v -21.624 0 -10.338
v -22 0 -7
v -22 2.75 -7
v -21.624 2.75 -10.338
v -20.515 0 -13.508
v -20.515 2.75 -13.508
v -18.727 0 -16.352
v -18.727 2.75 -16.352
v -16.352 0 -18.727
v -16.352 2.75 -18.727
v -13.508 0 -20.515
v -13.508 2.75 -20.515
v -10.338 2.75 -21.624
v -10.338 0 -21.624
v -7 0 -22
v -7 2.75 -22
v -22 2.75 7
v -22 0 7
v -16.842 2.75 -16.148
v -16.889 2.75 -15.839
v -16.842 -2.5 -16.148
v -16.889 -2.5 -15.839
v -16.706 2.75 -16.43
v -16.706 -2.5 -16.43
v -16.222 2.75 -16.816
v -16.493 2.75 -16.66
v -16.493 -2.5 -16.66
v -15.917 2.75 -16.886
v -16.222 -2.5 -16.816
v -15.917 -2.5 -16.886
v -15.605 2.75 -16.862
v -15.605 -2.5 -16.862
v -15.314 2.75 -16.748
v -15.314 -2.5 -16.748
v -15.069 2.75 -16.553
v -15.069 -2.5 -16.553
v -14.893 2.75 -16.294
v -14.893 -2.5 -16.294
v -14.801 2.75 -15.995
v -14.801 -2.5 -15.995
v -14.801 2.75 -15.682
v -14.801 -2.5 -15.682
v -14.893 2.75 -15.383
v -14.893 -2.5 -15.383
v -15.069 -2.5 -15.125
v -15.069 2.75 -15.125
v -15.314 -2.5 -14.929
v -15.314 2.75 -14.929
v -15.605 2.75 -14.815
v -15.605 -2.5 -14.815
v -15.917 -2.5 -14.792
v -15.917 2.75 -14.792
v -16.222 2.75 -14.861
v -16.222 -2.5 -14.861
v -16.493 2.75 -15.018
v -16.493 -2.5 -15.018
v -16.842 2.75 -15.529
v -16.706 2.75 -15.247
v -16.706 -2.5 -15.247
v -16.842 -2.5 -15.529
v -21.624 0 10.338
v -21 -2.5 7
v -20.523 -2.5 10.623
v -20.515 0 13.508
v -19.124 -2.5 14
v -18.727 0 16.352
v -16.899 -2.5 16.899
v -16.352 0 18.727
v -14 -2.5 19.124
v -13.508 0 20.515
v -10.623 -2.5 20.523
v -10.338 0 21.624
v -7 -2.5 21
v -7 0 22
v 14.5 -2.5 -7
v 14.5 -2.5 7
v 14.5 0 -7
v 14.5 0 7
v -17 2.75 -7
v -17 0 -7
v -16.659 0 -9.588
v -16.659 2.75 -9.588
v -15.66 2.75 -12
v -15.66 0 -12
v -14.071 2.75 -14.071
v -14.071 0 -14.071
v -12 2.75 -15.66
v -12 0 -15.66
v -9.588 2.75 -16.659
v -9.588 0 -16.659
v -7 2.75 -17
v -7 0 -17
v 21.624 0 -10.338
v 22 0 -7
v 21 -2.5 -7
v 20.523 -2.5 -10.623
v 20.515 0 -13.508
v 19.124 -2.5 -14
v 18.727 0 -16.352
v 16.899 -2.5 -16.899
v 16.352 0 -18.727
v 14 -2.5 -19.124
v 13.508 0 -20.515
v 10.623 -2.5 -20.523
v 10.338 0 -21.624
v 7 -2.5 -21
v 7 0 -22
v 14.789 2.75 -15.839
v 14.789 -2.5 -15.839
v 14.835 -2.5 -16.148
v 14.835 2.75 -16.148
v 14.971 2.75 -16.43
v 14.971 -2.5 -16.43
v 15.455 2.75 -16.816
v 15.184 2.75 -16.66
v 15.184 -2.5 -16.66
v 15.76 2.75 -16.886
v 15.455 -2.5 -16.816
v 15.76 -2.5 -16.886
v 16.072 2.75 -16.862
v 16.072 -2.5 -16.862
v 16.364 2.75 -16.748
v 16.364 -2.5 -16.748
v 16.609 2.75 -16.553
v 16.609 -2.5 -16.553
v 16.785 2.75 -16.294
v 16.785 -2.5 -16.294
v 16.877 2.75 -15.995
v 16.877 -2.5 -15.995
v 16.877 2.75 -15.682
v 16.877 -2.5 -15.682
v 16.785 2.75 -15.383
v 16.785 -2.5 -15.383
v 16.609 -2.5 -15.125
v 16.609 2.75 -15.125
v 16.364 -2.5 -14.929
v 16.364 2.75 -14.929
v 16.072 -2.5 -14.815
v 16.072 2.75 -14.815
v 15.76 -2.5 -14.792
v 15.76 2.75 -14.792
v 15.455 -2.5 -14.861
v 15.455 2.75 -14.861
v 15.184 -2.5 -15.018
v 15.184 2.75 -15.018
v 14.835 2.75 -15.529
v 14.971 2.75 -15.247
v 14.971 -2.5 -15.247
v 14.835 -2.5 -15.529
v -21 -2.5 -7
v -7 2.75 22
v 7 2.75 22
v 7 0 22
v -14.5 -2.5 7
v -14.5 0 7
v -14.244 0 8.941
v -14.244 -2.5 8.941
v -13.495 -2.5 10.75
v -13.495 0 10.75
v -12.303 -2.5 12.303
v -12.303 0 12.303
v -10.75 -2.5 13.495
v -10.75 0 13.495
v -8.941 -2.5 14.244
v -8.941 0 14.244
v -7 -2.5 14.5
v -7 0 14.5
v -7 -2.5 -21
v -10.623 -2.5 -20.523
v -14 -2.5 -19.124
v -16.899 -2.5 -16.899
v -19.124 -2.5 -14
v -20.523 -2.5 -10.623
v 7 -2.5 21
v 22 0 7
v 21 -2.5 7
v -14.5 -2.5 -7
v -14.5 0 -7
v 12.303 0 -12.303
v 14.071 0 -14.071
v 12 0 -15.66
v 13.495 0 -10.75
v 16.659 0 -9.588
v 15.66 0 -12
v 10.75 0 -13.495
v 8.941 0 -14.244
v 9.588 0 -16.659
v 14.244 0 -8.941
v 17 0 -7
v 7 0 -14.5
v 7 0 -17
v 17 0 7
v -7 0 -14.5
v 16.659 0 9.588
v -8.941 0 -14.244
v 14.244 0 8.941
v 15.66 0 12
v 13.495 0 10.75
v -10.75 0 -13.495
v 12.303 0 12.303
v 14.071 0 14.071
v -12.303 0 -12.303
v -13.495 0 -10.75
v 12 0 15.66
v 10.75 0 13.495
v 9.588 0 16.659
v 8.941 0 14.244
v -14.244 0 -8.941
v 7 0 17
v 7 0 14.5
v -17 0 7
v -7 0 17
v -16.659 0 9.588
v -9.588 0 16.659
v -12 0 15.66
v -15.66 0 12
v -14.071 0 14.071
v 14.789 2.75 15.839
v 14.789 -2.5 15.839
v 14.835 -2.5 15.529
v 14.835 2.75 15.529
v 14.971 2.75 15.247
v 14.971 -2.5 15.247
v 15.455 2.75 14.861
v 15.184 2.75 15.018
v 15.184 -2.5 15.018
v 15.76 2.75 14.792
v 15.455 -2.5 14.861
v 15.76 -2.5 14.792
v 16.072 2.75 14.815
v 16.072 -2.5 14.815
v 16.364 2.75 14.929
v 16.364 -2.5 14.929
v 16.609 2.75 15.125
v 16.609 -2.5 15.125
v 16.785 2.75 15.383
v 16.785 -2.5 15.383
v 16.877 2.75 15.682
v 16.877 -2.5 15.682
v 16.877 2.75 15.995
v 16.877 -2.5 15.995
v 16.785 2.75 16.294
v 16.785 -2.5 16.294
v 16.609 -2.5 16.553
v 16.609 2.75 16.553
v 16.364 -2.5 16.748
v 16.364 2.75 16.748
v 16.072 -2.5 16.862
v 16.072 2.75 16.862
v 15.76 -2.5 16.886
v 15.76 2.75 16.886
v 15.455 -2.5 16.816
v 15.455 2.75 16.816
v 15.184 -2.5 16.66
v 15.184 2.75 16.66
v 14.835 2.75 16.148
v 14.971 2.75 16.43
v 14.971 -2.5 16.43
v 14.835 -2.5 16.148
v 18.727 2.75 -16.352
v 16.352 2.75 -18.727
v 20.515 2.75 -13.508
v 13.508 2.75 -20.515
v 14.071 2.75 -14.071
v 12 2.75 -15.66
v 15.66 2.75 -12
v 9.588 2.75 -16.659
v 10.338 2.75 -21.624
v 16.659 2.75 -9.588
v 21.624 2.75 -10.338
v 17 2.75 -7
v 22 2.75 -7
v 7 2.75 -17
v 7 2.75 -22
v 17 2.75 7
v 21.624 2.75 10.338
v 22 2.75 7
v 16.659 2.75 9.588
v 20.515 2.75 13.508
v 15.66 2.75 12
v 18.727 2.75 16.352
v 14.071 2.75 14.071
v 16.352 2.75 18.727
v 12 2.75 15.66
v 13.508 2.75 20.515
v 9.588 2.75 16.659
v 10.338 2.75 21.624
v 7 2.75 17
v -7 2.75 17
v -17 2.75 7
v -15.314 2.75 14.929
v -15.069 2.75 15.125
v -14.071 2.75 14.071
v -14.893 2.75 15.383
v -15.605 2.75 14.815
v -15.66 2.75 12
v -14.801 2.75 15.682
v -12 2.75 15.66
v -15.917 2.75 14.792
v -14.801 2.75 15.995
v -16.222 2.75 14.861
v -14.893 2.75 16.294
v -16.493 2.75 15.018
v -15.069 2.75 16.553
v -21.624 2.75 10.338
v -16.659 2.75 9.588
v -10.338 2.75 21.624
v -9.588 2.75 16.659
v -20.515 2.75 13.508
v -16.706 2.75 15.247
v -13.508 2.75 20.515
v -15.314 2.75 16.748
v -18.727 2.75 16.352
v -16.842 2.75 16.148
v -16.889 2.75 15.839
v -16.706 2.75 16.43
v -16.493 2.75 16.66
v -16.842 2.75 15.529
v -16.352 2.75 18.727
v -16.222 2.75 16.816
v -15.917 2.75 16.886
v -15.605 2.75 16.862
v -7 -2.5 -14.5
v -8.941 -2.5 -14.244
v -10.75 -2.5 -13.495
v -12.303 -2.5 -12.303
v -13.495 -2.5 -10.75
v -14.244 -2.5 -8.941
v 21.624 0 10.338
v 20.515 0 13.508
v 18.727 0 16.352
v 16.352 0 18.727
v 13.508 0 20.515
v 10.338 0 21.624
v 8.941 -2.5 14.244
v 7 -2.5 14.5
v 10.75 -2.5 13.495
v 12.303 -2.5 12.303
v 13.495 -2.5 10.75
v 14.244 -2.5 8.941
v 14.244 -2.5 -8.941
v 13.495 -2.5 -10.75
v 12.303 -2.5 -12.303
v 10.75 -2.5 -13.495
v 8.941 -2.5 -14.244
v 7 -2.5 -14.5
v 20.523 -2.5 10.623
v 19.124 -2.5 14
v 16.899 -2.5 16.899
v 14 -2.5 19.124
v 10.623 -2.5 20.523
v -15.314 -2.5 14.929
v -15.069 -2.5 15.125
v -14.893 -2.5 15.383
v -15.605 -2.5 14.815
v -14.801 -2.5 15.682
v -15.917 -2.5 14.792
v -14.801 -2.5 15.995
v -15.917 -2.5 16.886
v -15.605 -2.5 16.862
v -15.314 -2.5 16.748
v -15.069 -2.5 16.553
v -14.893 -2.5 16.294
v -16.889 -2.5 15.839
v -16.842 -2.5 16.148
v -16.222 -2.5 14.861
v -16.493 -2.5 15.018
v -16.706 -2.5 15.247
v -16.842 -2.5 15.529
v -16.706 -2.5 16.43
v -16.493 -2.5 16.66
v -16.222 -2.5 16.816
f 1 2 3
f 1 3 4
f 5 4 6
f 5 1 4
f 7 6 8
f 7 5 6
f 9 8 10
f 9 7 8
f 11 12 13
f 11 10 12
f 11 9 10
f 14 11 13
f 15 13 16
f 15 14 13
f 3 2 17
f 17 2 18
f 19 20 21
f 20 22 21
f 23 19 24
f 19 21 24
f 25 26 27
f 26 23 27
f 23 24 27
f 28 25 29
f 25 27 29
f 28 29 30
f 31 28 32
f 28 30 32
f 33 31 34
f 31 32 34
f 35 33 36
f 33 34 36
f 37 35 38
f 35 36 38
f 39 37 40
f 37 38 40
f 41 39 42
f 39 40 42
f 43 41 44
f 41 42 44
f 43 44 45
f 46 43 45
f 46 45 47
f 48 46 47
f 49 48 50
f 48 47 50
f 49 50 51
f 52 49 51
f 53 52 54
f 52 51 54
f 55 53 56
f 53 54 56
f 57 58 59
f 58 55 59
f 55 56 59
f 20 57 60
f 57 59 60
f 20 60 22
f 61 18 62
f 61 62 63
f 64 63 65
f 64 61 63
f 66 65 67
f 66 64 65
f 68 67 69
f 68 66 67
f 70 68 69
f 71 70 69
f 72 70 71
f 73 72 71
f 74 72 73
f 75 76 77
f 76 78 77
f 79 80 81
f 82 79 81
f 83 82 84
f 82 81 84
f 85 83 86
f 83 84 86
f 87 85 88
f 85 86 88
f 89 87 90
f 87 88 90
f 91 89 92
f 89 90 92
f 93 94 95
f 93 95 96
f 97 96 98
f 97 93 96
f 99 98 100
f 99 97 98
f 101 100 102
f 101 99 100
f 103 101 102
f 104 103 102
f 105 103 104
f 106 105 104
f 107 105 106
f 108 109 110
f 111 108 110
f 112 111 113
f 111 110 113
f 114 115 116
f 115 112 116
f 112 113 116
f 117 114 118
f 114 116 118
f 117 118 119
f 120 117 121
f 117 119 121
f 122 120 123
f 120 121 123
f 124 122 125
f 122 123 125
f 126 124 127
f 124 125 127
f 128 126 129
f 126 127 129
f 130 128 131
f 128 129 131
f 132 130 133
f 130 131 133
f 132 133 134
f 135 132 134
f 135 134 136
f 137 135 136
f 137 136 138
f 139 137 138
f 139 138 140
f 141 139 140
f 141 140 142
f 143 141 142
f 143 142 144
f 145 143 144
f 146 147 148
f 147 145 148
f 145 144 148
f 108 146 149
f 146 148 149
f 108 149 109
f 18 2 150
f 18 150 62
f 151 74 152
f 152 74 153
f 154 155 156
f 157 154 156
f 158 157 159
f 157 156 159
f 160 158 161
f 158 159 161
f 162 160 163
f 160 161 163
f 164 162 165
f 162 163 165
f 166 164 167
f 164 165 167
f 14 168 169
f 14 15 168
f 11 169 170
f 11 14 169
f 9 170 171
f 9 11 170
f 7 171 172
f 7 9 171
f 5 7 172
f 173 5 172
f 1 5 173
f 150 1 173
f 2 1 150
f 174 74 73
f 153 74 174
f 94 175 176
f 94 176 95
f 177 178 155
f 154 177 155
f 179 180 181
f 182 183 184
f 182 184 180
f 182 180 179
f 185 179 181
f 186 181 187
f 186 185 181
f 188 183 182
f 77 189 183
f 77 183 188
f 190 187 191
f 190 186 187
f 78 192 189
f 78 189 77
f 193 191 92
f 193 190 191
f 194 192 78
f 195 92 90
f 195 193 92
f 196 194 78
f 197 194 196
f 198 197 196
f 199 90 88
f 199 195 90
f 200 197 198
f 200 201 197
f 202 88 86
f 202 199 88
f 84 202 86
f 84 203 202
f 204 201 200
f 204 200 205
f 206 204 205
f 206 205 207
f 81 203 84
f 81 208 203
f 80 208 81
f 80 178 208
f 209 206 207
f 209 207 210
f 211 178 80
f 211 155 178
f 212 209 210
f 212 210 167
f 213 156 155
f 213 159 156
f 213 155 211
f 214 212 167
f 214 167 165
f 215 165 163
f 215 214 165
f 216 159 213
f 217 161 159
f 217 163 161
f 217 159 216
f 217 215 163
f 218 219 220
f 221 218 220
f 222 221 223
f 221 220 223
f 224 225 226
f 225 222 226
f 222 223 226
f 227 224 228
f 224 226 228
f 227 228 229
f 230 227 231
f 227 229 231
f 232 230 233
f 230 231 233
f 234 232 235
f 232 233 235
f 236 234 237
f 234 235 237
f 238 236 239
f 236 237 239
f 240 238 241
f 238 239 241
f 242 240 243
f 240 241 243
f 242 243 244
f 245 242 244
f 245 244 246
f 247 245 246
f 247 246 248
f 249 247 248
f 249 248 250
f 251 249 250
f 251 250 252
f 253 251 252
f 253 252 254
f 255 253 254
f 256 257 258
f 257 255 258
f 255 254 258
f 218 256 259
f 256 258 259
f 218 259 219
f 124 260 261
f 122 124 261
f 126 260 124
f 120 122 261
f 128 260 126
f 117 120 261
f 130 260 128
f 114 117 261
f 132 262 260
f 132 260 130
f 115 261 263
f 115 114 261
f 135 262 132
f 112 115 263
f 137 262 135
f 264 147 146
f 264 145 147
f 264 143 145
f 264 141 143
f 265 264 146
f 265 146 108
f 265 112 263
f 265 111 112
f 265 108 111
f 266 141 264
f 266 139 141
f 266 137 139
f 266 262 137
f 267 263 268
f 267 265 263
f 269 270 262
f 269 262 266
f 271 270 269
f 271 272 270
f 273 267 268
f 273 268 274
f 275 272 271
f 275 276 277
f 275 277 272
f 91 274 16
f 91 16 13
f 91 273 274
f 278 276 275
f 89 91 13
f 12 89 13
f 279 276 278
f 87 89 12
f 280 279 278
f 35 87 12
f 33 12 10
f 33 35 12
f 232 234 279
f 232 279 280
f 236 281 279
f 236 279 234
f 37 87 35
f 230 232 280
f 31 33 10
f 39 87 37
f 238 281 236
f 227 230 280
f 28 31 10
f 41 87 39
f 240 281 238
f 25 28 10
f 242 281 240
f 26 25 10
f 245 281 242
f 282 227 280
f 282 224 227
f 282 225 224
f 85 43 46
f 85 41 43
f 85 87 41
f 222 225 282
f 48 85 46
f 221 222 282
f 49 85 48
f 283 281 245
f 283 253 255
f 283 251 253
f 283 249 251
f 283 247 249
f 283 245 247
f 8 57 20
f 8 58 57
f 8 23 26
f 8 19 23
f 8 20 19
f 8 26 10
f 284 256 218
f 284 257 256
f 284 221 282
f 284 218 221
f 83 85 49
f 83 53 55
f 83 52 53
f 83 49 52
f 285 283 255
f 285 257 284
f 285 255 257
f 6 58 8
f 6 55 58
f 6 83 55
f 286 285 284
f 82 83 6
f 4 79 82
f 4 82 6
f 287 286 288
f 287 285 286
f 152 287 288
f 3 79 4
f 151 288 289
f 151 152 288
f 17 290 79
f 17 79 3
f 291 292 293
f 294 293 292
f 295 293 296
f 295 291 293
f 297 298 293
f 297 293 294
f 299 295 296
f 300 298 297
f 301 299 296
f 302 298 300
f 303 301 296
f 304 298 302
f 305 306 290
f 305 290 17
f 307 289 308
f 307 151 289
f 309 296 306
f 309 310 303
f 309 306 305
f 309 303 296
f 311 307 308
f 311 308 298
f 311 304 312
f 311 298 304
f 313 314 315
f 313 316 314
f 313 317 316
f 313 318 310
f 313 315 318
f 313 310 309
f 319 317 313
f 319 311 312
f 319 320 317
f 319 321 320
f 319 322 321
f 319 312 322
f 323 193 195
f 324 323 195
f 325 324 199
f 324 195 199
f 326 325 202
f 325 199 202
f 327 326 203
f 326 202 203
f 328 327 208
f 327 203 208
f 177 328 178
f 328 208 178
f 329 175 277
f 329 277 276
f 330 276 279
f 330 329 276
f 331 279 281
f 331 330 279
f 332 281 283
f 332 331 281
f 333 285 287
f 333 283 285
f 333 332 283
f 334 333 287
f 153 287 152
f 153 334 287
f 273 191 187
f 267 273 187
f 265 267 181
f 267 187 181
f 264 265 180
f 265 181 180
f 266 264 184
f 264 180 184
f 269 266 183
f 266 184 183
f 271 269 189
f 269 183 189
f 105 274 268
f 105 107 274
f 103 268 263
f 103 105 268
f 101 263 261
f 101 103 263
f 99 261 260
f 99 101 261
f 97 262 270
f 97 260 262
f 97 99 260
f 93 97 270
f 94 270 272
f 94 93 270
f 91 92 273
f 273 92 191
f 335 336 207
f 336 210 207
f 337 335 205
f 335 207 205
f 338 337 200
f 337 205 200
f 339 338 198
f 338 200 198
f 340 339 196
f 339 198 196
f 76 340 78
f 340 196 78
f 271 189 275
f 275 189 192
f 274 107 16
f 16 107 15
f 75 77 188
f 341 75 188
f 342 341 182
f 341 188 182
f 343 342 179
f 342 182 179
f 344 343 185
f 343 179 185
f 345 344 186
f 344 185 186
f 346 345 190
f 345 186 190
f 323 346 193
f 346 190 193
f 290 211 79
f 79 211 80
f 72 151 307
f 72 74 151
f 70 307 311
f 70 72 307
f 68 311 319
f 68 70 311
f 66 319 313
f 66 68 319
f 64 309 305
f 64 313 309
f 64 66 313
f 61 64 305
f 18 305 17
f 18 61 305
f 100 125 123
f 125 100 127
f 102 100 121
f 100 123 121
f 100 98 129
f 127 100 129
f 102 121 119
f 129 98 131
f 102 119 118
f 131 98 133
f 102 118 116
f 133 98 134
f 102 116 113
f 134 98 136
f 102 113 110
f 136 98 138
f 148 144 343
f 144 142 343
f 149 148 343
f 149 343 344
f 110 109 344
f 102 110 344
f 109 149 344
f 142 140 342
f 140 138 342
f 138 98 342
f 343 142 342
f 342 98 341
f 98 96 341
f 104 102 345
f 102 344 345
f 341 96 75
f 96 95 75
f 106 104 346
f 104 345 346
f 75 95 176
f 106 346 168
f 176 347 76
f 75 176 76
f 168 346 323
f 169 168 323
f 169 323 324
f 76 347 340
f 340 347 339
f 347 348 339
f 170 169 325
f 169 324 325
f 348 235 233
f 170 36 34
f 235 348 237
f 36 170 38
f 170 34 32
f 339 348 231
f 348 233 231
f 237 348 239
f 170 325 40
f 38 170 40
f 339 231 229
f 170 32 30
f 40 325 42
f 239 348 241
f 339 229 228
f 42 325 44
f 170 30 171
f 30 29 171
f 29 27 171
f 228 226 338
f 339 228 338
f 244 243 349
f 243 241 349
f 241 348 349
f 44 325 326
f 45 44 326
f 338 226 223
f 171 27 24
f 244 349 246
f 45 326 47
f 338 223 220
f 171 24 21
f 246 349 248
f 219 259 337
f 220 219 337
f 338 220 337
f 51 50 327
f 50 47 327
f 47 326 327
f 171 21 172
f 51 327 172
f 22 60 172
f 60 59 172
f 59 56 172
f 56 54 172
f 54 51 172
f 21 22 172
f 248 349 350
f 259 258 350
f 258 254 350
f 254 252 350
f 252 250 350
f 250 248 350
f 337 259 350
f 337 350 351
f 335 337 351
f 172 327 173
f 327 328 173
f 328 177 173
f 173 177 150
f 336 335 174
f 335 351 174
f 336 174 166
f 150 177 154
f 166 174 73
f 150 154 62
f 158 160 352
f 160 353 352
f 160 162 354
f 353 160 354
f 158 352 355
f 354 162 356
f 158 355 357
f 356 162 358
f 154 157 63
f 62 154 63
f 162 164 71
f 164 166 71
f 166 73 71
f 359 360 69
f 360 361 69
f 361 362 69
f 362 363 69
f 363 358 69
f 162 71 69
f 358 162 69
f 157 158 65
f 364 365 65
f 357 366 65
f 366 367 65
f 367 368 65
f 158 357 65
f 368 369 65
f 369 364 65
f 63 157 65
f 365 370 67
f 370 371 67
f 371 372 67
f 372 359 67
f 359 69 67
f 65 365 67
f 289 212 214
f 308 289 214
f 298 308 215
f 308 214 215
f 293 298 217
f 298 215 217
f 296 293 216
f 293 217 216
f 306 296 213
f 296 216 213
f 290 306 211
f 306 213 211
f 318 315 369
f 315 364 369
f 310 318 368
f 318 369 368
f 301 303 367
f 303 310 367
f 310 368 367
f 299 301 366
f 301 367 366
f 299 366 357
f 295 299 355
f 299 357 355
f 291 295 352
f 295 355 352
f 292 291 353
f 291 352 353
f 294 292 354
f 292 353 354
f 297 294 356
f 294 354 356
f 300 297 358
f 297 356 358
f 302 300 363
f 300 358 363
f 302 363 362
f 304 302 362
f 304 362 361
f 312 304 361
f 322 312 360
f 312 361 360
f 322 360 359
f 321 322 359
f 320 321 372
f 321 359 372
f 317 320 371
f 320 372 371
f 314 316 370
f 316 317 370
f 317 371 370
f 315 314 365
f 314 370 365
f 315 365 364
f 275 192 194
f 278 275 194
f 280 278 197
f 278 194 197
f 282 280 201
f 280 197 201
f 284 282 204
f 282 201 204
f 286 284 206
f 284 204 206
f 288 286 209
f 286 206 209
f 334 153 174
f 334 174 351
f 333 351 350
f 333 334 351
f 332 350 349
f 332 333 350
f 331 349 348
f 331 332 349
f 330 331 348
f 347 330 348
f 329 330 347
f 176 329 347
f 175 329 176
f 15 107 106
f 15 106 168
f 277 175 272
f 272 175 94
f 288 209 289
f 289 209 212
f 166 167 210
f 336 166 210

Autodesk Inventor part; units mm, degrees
ref_plane "YZ Plane" through (0, 0, 0) normal (1, 0, 0) x (0, 1, 0)
ref_plane "XZ Plane" through (0, 0, 0) normal (0, 1, 0) x (-1, 0, 0)
ref_plane "XY Plane" through (0, 0, 0) normal (0, 0, 1) x (1, 0, 0)
sketch "Sketch1" plane through (0, 0, 0) normal (0, 1, 0) x (-1, 0, 0)
  line L0 (-7, 17) -> (7, 17)
  line L1 (17, 7) -> (17, -7)
  line L2 (7, -17) -> (-7, -17)
  line L3 (-17, -7) -> (-17, 7)
  line L4 (-17, 17) -> (17, -17) construction
  line L5 (17, 17) -> (-17, -17) construction
  arc A0 (17, 7) -> (7, 17) centre (7, 7) ccw
  arc A1 (7, -17) -> (17, -7) centre (7, -7) ccw
  arc A2 (-17, -7) -> (-7, -17) centre (-7, -7) ccw
  arc A3 (-7, 17) -> (-17, 7) centre (-7, 7) ccw
  line L6 (-7, -22) -> (7, -22)
  arc A4 (7, -22) -> (22, -7) centre (7, -7) ccw
  line L7 (22, -7) -> (22, 7)
  arc A5 (22, 7) -> (7, 22) centre (7, 7) ccw
  line L8 (7, 22) -> (-7, 22)
  arc A6 (-7, 22) -> (-22, 7) centre (-7, 7) ccw
  line L9 (-22, 7) -> (-22, -7)
  arc A7 (-22, -7) -> (-7, -22) centre (-7, -7) ccw
  circle A8 centre (-15.8388, -15.8388) radius 1.05
  line L10 (-14.0711, -14.0711) -> (-17.6066, -17.6066) construction
  circle A9 centre (15.8388, -15.8388) radius 1.05
  circle A10 centre (15.8388, 15.8388) radius 1.05
  circle A11 centre (-15.8388, 15.8388) radius 1.05
  line L11 (14.5, -7) -> (14.5, 7)
  arc A12 (14.5, 7) -> (7, 14.5) centre (7, 7) ccw
  line L12 (7, 14.5) -> (-7, 14.5)
  arc A13 (-7, 14.5) -> (-14.5, 7) centre (-7, 7) ccw
  line L13 (-14.5, 7) -> (-14.5, -7)
  arc A14 (-14.5, -7) -> (-7, -14.5) centre (-7, -7) ccw
  line L14 (-7, -14.5) -> (7, -14.5)
  arc A15 (7, -14.5) -> (14.5, -7) centre (7, -7) ccw
  point P0 (0, 0)
  dimension "d0" = 34
  dimension "d1" = 34
  dimension "d2" = 10
  dimension "d3" = 5
  dimension "d4" = 2.1
  dimension "d7" = 360
  dimension "d11" = 2.5
extrude "Extrusion1" add sketch "Sketch1" along normal blind 2.75 contours A7 L9 A6 L8 A5 L7 A4 L6
extrude "Extrusion2" add sketch "Sketch1" against normal blind 2.5 contours L0 A0 L1 A1 L2 A2 L3 A3 | A7 L9 A6 L8 A5 L7 A4 L6
chamfer "Chamfer1" distance 1 distance2 2.5 8 edges at (17.6066, -2.5, 17.6066) (0, -2.5, 22) (-17.6066, -2.5, 17.6066) (-22, -2.5, 0) (-17.6066, -2.5, -17.6066) (0, -2.5, -22) (17.6066, -2.5, -17.6066) (22, -2.5, 0) measured on face at (19.5, -2.5, 2.3333)
properties part number "subcap"
